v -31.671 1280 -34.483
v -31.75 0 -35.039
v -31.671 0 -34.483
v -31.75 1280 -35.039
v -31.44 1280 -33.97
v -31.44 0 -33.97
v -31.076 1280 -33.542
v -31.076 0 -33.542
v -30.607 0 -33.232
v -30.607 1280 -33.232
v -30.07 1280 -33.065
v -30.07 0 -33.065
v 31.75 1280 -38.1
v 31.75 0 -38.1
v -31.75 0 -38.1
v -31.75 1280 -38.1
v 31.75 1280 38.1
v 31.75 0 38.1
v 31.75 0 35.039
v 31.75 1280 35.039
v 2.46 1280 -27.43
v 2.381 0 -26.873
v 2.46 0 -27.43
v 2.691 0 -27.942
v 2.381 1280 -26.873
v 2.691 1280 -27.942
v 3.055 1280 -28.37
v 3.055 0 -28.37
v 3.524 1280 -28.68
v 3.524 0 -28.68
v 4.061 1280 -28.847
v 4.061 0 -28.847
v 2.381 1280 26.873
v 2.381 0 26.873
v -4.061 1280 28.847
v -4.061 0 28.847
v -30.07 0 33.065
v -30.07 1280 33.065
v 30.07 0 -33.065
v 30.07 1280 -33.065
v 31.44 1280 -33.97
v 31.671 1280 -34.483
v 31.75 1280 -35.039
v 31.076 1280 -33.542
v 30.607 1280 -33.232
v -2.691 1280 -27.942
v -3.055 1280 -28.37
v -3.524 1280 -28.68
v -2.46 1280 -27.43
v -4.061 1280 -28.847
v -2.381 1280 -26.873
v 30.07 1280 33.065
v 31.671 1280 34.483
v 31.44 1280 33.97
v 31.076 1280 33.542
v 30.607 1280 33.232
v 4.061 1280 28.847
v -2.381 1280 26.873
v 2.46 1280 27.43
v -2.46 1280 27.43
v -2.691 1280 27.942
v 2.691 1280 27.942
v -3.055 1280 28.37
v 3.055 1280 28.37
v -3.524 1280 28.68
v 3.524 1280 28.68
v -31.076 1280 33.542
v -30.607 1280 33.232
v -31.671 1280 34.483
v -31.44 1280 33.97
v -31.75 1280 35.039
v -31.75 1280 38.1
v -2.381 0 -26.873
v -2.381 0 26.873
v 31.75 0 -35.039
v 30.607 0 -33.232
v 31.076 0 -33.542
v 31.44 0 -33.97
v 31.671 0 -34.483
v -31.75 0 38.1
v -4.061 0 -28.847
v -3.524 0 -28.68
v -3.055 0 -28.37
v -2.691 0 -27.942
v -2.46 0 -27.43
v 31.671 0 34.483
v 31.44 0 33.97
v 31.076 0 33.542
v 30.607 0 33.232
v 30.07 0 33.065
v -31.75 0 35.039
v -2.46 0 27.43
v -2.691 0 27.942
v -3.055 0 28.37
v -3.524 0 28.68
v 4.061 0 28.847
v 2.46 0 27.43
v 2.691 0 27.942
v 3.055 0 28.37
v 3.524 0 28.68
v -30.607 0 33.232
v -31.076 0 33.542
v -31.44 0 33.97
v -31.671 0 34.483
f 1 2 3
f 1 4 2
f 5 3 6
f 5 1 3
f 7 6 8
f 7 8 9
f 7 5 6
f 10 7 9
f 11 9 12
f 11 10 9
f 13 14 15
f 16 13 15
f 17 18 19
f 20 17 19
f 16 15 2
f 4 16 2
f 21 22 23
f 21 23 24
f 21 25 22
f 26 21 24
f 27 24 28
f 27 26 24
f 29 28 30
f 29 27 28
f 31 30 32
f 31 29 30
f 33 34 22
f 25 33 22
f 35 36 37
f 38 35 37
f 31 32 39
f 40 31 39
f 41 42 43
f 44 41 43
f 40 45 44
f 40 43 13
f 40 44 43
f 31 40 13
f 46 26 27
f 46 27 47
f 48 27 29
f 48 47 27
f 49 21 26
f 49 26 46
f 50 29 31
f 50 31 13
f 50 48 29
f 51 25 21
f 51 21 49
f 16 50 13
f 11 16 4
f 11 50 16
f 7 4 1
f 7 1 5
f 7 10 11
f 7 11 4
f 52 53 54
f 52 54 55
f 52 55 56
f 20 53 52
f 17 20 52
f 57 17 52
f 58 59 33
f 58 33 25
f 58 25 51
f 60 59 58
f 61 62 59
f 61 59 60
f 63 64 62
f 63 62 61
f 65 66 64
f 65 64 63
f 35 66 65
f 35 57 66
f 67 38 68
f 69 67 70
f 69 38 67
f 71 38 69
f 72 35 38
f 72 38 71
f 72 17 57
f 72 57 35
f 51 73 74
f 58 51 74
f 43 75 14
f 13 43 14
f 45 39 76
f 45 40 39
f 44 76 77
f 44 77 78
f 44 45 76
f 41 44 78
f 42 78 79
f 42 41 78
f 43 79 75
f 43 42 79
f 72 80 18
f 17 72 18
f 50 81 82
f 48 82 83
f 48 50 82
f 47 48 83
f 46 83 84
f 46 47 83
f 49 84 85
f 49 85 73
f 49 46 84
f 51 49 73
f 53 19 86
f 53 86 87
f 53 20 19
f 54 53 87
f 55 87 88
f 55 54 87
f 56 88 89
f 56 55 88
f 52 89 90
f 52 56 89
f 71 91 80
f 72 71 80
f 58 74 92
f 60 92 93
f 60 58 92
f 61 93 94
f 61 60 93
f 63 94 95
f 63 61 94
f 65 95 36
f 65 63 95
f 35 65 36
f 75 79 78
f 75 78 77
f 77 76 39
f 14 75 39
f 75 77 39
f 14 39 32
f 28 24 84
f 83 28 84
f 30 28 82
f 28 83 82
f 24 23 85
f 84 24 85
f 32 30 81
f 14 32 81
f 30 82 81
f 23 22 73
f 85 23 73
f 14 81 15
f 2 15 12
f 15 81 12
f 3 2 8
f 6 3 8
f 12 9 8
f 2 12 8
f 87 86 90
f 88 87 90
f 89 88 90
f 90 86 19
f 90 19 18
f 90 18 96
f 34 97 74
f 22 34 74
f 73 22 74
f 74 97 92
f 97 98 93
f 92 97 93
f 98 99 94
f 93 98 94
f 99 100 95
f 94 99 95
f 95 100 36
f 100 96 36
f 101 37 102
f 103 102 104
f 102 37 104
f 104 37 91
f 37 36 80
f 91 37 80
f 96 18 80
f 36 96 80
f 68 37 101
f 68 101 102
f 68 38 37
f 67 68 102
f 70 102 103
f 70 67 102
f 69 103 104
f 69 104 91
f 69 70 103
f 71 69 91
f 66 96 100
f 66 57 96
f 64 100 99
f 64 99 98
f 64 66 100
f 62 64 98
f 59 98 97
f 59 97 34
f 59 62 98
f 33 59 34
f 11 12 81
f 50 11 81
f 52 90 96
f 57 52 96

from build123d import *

# Parameters (mm, degrees)
EXTRUDE_DEPTH = 1280
FILLET_R      = 2


with BuildPart() as part:
    # Sketch → Extrude (new body)
    with BuildSketch(Plane.XZ):
        Polygon((-31.75, 38.1), (31.75, 38.1), (31.75, 33.3375), (2.38125, 28.575), (2.38125, -28.575), (31.75, -33.3375), (31.75, -38.1), (-31.75, -38.1), (-31.75, -33.3375), (-2.38125, -28.575), (-2.38125, 28.575), (-31.75, 33.3375), align=None)
    extrude(amount=-EXTRUDE_DEPTH)

    # Fillet
    fillet_edges = [part.edges().sort_by_distance(p)[0] for p in [
        (31.75, 640, 33.3375),
        (2.38125, 640, 28.575),
        (2.38125, 640, -28.575),
        (31.75, 640, -33.3375),
        (-31.75, 640, -33.3375),
        (-2.38125, 640, -28.575),
        (-2.38125, 640, 28.575),
        (-31.75, 640, 33.3375),
    ]]
    fillet(fillet_edges, radius=FILLET_R)


solid = part.part
